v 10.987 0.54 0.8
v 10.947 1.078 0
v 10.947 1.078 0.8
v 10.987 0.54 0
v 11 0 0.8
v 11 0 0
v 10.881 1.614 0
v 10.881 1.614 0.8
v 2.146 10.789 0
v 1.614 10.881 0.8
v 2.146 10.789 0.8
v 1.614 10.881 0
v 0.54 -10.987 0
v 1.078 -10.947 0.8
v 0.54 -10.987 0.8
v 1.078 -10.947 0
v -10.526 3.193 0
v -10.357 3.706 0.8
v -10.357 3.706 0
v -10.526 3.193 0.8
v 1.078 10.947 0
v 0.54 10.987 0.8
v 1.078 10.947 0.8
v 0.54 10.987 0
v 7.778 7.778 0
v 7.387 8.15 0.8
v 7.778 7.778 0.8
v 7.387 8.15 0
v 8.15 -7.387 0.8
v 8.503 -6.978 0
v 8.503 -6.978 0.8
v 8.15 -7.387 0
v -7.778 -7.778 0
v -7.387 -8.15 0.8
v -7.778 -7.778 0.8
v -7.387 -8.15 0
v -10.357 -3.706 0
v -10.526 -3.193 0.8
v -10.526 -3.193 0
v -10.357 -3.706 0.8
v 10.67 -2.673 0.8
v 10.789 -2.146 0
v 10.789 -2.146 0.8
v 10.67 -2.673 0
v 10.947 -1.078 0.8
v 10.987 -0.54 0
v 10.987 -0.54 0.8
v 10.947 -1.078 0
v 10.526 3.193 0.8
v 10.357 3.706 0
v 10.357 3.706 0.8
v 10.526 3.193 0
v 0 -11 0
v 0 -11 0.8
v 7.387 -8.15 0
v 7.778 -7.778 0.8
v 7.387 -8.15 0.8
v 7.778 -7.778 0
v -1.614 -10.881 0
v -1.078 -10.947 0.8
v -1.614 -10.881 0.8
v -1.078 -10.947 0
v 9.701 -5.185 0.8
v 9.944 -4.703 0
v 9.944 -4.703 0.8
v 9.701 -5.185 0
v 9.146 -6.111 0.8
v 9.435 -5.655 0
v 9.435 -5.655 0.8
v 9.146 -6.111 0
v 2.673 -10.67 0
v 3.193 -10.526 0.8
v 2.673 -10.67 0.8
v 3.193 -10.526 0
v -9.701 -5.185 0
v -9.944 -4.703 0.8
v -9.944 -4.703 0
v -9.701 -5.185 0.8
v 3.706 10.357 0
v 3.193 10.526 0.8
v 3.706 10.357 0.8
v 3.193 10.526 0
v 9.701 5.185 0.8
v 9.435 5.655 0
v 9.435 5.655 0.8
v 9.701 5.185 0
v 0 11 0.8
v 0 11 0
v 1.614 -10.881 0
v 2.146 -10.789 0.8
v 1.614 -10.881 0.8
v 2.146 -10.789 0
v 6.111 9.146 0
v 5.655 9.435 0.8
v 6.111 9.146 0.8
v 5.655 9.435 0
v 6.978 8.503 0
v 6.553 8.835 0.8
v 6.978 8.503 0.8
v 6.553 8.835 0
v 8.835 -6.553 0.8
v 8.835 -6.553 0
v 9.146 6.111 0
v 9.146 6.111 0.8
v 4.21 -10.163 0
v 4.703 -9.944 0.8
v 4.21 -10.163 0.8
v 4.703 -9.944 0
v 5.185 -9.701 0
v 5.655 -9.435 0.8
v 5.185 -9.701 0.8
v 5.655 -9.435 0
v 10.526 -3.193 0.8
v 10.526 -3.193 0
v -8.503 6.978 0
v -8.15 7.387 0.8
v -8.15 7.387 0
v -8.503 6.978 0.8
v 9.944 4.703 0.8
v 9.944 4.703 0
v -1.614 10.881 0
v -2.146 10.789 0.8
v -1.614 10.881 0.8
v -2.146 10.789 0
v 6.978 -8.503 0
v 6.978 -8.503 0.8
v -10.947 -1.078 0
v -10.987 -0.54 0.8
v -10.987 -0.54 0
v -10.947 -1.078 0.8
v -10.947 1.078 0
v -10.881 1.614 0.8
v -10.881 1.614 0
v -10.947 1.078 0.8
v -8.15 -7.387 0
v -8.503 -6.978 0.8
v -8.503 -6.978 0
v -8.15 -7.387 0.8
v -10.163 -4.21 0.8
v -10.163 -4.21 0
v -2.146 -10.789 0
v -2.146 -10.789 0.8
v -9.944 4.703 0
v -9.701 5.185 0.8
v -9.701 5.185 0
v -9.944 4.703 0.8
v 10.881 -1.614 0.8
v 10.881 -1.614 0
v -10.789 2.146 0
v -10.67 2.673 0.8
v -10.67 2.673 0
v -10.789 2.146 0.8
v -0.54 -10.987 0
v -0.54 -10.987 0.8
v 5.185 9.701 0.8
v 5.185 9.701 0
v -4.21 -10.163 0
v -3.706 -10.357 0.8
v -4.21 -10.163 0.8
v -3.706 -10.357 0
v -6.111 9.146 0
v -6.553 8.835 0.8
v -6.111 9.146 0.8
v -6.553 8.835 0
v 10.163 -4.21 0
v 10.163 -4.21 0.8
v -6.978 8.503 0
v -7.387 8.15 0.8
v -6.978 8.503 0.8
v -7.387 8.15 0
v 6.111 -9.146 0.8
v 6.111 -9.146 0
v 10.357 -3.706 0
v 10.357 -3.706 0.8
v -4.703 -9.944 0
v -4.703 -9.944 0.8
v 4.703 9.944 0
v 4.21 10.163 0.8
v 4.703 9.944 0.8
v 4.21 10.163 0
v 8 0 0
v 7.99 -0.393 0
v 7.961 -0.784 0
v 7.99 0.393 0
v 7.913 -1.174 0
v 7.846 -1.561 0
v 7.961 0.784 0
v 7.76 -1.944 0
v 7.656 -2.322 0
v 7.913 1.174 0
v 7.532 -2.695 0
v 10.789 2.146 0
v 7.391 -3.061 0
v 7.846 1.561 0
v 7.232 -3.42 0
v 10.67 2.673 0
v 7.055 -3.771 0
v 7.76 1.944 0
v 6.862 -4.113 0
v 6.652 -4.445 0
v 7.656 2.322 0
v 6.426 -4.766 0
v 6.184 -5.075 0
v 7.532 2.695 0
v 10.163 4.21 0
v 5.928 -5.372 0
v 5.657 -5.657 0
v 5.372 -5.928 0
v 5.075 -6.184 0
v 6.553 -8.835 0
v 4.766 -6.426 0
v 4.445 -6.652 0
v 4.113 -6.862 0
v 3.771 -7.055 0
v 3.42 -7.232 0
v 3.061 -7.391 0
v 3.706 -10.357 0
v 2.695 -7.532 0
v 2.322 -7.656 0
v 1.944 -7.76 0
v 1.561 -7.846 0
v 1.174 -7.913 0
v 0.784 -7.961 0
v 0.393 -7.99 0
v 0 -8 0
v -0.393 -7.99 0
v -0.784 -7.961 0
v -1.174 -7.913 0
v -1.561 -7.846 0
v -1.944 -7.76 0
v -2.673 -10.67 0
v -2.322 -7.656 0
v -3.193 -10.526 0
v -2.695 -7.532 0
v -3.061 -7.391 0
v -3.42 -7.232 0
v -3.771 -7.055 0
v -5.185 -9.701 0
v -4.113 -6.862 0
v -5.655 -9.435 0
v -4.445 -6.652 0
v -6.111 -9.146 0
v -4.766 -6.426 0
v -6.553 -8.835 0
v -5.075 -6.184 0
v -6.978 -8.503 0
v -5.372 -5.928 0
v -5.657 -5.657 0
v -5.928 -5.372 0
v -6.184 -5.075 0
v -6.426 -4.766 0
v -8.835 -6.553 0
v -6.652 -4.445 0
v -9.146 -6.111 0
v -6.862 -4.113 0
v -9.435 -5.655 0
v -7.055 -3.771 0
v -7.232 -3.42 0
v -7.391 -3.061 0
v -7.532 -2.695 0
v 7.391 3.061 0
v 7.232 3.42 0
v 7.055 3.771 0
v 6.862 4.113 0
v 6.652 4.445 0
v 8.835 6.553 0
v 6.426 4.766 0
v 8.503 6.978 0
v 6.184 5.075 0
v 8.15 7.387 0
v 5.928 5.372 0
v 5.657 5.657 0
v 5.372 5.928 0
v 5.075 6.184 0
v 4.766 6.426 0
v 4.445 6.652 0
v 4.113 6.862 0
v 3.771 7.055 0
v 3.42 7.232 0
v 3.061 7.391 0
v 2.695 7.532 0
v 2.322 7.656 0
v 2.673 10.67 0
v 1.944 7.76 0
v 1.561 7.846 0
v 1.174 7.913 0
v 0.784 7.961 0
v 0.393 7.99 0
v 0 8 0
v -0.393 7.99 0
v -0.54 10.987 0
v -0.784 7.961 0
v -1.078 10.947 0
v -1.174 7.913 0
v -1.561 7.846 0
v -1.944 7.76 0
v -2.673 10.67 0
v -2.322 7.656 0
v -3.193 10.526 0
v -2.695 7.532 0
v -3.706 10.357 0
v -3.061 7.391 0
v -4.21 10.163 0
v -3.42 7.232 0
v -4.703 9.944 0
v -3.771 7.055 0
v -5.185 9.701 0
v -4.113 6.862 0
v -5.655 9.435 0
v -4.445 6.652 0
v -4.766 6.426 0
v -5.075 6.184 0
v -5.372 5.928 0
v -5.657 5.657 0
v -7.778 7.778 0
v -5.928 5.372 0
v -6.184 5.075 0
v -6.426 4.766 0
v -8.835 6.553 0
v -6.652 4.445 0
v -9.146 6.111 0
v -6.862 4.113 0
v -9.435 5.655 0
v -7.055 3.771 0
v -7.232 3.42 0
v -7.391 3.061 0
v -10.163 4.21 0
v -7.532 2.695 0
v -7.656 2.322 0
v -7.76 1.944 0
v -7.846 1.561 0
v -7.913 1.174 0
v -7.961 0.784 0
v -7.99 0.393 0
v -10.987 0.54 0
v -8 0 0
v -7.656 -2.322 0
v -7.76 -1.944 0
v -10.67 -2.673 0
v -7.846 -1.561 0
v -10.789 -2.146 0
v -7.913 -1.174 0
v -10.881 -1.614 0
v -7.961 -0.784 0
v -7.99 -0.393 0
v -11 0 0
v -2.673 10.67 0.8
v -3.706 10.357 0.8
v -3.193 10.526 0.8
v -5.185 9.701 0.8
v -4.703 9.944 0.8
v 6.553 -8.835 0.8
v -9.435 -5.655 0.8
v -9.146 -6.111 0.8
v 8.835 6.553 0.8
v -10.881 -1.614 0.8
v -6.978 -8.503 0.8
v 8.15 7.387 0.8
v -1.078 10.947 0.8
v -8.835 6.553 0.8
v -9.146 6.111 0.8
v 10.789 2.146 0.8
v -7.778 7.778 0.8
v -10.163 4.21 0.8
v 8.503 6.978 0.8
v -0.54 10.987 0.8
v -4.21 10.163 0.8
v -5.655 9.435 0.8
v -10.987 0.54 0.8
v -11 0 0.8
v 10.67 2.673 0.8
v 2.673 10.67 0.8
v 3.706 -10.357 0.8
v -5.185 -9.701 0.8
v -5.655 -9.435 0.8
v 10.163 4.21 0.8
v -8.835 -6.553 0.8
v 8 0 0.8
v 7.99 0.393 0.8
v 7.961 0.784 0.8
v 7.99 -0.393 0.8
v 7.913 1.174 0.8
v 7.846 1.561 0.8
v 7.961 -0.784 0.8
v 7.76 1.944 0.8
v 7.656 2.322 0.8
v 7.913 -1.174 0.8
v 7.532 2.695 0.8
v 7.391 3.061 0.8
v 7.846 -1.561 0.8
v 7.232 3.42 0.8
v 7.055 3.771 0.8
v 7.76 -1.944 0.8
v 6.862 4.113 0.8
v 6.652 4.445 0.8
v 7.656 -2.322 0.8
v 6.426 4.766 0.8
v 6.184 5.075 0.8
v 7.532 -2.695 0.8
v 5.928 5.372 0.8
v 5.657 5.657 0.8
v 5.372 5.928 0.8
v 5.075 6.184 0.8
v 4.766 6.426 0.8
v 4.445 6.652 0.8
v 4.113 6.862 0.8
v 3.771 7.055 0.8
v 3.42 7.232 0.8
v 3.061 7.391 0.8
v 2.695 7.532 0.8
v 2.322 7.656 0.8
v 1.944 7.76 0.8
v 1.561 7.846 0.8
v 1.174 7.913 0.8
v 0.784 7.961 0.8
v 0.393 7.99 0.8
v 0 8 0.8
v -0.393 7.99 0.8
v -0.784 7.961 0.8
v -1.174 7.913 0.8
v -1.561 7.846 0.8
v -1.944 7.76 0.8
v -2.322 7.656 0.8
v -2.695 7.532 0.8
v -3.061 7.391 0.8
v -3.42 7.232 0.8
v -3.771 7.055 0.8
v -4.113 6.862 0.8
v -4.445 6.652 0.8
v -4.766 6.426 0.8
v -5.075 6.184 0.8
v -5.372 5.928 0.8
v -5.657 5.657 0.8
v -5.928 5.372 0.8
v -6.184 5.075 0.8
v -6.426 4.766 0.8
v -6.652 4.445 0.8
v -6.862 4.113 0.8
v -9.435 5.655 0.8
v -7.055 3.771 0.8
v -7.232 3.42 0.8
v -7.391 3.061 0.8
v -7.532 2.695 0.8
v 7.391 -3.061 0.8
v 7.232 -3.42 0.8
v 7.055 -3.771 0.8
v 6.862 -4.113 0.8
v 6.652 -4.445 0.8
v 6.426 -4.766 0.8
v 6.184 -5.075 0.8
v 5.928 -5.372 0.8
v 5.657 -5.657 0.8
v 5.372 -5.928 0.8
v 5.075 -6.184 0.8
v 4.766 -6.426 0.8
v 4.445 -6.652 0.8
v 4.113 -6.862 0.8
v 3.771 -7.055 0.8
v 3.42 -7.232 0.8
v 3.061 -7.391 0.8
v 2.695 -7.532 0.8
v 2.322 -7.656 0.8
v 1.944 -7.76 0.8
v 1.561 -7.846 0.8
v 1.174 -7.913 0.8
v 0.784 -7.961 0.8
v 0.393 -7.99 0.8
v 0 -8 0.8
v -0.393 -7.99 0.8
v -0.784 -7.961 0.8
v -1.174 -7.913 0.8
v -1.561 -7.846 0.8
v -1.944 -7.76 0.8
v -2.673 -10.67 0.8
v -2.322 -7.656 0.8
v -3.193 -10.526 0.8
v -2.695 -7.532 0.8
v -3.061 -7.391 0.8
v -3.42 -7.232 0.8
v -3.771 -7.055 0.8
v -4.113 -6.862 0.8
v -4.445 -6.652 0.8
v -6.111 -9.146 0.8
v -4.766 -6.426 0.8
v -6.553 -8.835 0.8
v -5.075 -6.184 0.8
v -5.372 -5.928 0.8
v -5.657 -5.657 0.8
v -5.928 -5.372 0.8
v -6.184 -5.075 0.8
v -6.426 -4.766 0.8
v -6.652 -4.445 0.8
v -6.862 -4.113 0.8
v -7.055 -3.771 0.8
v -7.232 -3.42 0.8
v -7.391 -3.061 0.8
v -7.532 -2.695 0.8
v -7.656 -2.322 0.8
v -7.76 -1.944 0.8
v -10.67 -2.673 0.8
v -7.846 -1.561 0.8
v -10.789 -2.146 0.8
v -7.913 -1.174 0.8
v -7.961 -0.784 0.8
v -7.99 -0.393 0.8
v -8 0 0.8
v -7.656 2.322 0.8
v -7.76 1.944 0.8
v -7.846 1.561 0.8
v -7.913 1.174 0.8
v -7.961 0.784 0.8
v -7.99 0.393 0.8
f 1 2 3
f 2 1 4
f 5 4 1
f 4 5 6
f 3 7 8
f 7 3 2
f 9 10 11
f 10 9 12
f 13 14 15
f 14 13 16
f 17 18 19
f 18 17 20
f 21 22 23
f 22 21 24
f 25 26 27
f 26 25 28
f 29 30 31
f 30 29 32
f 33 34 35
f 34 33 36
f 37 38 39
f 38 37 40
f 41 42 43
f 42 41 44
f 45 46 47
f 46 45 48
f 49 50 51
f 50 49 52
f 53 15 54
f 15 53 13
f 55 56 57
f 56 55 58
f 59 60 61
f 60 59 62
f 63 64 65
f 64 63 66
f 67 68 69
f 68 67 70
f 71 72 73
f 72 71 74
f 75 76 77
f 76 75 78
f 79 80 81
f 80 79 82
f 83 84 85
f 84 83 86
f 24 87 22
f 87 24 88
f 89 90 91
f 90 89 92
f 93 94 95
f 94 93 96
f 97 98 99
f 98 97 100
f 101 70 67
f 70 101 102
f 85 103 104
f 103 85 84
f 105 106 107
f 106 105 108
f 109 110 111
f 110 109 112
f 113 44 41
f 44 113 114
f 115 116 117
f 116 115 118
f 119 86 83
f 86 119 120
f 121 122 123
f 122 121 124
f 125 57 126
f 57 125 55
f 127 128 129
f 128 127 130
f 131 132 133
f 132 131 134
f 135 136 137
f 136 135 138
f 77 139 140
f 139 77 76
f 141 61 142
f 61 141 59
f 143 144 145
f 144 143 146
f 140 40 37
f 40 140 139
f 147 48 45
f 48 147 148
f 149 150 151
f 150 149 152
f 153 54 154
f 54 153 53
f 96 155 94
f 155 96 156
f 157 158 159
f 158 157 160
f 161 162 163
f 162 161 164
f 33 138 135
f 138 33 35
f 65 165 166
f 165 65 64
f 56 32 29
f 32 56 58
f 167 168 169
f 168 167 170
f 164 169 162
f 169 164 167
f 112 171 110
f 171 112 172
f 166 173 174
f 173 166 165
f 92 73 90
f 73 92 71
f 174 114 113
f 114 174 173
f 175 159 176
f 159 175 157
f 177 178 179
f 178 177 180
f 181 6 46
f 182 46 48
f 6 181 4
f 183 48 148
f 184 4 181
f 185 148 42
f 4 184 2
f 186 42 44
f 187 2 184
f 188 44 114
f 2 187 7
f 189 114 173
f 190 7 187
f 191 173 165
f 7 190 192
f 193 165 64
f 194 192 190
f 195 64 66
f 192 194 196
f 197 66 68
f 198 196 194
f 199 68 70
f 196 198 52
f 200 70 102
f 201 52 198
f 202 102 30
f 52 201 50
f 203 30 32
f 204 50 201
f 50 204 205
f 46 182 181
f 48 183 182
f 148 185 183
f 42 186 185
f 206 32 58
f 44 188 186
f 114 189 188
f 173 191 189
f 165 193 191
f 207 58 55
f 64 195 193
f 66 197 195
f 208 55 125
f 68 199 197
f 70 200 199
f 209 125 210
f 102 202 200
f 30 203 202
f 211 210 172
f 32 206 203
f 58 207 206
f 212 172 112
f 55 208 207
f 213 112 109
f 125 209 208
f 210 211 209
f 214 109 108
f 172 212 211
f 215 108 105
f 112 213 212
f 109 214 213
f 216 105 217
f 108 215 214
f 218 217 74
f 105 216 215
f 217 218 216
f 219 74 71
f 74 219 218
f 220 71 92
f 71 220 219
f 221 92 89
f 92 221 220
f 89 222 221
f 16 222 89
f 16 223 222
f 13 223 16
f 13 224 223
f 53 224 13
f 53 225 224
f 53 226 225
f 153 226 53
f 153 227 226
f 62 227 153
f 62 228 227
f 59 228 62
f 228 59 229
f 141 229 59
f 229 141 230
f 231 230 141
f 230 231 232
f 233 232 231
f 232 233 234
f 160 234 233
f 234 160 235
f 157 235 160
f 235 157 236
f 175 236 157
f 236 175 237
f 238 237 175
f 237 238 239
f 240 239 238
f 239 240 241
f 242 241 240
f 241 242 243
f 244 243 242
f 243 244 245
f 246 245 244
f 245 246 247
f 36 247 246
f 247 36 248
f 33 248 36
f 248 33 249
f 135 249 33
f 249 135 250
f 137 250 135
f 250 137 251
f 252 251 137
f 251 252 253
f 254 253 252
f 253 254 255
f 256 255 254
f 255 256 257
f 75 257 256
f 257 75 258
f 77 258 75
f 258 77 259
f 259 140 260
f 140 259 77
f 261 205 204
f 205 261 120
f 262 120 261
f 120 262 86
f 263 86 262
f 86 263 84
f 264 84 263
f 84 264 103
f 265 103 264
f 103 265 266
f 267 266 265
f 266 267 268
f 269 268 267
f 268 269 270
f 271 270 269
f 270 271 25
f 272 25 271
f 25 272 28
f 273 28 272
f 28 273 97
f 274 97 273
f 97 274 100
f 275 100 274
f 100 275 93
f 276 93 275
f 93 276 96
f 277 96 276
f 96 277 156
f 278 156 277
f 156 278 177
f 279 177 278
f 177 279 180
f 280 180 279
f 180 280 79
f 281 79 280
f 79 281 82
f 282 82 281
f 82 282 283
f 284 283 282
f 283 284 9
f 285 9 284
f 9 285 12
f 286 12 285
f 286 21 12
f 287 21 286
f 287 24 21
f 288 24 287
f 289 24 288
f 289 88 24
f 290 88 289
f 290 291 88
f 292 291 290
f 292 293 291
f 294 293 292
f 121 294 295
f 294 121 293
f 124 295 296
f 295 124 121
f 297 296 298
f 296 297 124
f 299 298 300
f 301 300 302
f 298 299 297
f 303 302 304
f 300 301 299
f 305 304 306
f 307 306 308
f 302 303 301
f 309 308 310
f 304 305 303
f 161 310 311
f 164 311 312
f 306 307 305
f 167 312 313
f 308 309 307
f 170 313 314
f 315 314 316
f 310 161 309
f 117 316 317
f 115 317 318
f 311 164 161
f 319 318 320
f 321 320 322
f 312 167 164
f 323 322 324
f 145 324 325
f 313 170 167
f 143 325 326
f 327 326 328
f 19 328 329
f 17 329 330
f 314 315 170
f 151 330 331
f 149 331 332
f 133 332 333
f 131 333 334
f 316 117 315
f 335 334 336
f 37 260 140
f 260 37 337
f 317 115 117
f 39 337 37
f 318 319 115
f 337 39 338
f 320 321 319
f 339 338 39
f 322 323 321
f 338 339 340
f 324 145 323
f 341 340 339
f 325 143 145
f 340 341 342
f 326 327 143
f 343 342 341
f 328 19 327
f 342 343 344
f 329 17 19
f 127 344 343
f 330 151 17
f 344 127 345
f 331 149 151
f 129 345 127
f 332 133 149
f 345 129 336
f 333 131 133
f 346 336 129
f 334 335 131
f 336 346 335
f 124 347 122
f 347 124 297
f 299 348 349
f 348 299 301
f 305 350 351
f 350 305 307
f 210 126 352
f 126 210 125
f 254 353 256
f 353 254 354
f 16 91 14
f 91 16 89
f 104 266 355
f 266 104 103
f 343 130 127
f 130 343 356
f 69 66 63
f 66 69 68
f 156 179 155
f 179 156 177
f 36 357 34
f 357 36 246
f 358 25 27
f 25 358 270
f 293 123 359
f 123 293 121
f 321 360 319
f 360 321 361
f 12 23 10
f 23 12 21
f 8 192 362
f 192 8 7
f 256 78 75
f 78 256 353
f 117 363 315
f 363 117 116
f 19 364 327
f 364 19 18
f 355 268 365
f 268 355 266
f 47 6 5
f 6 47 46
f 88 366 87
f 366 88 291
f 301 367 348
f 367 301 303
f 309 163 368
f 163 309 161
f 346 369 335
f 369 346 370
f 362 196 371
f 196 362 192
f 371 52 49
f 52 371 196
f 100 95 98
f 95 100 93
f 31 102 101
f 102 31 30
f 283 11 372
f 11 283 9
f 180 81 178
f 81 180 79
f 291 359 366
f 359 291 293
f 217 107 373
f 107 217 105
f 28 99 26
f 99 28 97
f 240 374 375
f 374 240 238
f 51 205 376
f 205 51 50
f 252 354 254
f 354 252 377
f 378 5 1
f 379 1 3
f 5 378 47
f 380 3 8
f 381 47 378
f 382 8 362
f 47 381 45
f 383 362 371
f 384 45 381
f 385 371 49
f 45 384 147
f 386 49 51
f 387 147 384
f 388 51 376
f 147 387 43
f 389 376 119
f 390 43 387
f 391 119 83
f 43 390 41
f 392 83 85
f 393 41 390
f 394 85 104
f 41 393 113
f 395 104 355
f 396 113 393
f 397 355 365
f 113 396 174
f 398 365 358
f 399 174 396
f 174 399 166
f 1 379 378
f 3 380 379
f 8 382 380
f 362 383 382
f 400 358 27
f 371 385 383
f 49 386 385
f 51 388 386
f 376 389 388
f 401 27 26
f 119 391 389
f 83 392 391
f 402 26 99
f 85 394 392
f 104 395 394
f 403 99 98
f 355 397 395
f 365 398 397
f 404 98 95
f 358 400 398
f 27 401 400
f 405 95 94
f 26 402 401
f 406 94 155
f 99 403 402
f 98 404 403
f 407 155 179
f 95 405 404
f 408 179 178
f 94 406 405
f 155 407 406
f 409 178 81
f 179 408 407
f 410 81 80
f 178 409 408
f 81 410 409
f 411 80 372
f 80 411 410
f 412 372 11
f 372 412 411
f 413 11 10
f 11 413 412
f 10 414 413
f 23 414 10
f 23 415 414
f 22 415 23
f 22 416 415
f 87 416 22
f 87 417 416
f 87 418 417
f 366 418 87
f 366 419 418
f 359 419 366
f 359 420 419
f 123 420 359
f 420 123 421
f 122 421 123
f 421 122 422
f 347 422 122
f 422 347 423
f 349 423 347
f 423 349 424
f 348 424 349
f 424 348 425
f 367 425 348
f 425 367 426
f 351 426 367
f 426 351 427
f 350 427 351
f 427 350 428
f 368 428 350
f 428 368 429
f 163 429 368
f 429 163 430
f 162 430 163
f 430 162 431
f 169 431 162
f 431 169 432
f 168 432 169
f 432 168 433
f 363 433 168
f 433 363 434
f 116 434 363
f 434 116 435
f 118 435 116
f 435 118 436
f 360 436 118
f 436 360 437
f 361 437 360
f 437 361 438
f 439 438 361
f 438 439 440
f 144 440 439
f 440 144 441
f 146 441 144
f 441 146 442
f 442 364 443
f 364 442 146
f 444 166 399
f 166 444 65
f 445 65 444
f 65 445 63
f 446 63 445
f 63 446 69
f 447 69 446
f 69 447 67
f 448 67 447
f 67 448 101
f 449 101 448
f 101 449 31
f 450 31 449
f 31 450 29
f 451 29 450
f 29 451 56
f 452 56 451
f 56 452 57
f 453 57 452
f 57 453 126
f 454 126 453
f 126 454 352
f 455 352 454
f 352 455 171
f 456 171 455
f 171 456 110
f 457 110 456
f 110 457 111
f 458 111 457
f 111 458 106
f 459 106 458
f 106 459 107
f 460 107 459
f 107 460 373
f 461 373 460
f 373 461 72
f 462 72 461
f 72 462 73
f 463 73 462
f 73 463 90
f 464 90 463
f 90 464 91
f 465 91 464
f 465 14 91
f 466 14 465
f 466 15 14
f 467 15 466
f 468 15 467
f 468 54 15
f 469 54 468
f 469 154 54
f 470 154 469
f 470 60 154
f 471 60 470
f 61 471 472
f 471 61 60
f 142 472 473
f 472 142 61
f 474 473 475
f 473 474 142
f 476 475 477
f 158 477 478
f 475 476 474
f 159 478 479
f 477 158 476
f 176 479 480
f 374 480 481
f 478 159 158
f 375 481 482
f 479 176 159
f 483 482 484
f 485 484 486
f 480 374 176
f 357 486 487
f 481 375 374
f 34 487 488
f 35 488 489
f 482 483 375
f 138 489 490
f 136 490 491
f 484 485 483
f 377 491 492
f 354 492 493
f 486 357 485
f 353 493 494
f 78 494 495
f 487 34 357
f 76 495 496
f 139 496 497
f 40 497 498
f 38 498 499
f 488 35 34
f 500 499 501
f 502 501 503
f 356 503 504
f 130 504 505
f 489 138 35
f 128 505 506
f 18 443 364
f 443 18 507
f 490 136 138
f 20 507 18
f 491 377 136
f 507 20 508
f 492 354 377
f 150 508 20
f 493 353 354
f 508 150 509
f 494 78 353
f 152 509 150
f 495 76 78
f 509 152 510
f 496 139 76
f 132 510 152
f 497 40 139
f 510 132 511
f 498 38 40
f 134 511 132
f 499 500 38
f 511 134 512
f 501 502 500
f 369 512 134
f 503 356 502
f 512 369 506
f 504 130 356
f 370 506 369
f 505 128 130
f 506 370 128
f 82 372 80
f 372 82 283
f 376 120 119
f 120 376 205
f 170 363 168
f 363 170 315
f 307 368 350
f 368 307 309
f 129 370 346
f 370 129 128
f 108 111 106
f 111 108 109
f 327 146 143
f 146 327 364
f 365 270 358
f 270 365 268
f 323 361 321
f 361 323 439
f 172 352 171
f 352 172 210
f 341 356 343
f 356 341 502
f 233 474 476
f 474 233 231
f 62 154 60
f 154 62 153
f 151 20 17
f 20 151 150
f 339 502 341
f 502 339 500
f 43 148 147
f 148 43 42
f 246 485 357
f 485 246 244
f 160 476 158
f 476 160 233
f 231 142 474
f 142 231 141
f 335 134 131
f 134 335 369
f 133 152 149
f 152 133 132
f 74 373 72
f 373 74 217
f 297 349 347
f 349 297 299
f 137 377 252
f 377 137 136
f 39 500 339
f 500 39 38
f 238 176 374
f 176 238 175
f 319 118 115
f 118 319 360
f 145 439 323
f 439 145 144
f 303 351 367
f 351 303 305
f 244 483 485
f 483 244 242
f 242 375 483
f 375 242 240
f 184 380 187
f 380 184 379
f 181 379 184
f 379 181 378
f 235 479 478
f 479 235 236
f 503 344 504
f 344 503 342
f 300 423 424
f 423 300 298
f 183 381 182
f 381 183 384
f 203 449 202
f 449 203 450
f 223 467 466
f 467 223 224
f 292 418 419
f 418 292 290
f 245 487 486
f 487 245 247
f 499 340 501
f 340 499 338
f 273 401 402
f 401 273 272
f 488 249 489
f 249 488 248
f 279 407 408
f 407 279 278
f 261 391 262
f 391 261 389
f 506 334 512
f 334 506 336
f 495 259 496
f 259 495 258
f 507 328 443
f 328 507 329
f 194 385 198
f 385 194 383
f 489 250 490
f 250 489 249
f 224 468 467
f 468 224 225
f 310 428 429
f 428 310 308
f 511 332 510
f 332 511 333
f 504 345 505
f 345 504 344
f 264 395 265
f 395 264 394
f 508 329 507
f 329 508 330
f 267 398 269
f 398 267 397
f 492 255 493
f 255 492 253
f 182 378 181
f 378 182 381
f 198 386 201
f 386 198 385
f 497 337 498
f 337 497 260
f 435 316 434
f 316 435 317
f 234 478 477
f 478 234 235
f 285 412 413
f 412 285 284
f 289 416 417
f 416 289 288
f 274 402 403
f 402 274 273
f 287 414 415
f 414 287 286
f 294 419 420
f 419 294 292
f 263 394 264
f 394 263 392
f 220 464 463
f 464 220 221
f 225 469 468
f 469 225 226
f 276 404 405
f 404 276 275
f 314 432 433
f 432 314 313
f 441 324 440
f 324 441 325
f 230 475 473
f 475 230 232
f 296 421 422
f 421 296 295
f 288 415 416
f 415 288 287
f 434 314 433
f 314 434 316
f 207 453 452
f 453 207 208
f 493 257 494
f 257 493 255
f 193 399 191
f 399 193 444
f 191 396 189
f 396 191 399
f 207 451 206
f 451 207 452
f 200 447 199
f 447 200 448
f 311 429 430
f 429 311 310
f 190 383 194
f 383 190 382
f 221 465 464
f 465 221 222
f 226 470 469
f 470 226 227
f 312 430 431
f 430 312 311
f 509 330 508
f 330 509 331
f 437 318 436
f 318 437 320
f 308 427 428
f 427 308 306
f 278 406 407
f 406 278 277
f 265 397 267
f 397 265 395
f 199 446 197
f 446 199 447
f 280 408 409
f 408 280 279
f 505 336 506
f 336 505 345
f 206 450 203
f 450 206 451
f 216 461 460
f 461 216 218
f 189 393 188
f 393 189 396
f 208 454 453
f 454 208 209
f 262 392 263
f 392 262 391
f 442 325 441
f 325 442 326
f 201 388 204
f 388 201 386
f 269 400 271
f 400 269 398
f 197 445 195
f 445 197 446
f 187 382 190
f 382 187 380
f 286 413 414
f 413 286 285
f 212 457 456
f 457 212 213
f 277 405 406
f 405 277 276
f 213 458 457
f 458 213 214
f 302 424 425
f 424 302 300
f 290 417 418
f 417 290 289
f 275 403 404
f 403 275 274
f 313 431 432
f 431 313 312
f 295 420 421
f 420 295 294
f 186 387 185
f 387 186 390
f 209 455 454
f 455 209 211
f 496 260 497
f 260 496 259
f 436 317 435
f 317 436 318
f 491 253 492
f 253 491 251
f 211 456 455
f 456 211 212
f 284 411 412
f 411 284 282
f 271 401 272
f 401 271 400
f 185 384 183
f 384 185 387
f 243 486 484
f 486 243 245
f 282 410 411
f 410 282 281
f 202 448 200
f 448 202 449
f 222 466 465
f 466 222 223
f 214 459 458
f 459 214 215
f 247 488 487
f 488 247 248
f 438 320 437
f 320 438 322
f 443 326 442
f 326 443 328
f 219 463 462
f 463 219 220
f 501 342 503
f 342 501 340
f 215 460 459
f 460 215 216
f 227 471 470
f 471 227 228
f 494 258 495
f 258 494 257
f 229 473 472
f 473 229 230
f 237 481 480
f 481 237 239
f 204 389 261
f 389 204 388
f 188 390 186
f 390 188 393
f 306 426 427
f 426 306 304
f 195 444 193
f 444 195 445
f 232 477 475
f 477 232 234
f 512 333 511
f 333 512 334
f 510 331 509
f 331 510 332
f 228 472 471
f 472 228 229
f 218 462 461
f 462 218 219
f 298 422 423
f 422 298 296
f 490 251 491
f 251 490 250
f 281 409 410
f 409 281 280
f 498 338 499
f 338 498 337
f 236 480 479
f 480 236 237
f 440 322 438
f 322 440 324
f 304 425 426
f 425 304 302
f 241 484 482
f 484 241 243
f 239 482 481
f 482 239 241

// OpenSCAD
// Edge I/O Ring PCB 3D (digital)
od=22.0; id=16.0; t=0.8;
difference(){
  cylinder(h=t,r=od/2,$fn=128);
  translate([0,0,-0.1]) cylinder(h=t+0.2,r=id/2,$fn=128);
}
